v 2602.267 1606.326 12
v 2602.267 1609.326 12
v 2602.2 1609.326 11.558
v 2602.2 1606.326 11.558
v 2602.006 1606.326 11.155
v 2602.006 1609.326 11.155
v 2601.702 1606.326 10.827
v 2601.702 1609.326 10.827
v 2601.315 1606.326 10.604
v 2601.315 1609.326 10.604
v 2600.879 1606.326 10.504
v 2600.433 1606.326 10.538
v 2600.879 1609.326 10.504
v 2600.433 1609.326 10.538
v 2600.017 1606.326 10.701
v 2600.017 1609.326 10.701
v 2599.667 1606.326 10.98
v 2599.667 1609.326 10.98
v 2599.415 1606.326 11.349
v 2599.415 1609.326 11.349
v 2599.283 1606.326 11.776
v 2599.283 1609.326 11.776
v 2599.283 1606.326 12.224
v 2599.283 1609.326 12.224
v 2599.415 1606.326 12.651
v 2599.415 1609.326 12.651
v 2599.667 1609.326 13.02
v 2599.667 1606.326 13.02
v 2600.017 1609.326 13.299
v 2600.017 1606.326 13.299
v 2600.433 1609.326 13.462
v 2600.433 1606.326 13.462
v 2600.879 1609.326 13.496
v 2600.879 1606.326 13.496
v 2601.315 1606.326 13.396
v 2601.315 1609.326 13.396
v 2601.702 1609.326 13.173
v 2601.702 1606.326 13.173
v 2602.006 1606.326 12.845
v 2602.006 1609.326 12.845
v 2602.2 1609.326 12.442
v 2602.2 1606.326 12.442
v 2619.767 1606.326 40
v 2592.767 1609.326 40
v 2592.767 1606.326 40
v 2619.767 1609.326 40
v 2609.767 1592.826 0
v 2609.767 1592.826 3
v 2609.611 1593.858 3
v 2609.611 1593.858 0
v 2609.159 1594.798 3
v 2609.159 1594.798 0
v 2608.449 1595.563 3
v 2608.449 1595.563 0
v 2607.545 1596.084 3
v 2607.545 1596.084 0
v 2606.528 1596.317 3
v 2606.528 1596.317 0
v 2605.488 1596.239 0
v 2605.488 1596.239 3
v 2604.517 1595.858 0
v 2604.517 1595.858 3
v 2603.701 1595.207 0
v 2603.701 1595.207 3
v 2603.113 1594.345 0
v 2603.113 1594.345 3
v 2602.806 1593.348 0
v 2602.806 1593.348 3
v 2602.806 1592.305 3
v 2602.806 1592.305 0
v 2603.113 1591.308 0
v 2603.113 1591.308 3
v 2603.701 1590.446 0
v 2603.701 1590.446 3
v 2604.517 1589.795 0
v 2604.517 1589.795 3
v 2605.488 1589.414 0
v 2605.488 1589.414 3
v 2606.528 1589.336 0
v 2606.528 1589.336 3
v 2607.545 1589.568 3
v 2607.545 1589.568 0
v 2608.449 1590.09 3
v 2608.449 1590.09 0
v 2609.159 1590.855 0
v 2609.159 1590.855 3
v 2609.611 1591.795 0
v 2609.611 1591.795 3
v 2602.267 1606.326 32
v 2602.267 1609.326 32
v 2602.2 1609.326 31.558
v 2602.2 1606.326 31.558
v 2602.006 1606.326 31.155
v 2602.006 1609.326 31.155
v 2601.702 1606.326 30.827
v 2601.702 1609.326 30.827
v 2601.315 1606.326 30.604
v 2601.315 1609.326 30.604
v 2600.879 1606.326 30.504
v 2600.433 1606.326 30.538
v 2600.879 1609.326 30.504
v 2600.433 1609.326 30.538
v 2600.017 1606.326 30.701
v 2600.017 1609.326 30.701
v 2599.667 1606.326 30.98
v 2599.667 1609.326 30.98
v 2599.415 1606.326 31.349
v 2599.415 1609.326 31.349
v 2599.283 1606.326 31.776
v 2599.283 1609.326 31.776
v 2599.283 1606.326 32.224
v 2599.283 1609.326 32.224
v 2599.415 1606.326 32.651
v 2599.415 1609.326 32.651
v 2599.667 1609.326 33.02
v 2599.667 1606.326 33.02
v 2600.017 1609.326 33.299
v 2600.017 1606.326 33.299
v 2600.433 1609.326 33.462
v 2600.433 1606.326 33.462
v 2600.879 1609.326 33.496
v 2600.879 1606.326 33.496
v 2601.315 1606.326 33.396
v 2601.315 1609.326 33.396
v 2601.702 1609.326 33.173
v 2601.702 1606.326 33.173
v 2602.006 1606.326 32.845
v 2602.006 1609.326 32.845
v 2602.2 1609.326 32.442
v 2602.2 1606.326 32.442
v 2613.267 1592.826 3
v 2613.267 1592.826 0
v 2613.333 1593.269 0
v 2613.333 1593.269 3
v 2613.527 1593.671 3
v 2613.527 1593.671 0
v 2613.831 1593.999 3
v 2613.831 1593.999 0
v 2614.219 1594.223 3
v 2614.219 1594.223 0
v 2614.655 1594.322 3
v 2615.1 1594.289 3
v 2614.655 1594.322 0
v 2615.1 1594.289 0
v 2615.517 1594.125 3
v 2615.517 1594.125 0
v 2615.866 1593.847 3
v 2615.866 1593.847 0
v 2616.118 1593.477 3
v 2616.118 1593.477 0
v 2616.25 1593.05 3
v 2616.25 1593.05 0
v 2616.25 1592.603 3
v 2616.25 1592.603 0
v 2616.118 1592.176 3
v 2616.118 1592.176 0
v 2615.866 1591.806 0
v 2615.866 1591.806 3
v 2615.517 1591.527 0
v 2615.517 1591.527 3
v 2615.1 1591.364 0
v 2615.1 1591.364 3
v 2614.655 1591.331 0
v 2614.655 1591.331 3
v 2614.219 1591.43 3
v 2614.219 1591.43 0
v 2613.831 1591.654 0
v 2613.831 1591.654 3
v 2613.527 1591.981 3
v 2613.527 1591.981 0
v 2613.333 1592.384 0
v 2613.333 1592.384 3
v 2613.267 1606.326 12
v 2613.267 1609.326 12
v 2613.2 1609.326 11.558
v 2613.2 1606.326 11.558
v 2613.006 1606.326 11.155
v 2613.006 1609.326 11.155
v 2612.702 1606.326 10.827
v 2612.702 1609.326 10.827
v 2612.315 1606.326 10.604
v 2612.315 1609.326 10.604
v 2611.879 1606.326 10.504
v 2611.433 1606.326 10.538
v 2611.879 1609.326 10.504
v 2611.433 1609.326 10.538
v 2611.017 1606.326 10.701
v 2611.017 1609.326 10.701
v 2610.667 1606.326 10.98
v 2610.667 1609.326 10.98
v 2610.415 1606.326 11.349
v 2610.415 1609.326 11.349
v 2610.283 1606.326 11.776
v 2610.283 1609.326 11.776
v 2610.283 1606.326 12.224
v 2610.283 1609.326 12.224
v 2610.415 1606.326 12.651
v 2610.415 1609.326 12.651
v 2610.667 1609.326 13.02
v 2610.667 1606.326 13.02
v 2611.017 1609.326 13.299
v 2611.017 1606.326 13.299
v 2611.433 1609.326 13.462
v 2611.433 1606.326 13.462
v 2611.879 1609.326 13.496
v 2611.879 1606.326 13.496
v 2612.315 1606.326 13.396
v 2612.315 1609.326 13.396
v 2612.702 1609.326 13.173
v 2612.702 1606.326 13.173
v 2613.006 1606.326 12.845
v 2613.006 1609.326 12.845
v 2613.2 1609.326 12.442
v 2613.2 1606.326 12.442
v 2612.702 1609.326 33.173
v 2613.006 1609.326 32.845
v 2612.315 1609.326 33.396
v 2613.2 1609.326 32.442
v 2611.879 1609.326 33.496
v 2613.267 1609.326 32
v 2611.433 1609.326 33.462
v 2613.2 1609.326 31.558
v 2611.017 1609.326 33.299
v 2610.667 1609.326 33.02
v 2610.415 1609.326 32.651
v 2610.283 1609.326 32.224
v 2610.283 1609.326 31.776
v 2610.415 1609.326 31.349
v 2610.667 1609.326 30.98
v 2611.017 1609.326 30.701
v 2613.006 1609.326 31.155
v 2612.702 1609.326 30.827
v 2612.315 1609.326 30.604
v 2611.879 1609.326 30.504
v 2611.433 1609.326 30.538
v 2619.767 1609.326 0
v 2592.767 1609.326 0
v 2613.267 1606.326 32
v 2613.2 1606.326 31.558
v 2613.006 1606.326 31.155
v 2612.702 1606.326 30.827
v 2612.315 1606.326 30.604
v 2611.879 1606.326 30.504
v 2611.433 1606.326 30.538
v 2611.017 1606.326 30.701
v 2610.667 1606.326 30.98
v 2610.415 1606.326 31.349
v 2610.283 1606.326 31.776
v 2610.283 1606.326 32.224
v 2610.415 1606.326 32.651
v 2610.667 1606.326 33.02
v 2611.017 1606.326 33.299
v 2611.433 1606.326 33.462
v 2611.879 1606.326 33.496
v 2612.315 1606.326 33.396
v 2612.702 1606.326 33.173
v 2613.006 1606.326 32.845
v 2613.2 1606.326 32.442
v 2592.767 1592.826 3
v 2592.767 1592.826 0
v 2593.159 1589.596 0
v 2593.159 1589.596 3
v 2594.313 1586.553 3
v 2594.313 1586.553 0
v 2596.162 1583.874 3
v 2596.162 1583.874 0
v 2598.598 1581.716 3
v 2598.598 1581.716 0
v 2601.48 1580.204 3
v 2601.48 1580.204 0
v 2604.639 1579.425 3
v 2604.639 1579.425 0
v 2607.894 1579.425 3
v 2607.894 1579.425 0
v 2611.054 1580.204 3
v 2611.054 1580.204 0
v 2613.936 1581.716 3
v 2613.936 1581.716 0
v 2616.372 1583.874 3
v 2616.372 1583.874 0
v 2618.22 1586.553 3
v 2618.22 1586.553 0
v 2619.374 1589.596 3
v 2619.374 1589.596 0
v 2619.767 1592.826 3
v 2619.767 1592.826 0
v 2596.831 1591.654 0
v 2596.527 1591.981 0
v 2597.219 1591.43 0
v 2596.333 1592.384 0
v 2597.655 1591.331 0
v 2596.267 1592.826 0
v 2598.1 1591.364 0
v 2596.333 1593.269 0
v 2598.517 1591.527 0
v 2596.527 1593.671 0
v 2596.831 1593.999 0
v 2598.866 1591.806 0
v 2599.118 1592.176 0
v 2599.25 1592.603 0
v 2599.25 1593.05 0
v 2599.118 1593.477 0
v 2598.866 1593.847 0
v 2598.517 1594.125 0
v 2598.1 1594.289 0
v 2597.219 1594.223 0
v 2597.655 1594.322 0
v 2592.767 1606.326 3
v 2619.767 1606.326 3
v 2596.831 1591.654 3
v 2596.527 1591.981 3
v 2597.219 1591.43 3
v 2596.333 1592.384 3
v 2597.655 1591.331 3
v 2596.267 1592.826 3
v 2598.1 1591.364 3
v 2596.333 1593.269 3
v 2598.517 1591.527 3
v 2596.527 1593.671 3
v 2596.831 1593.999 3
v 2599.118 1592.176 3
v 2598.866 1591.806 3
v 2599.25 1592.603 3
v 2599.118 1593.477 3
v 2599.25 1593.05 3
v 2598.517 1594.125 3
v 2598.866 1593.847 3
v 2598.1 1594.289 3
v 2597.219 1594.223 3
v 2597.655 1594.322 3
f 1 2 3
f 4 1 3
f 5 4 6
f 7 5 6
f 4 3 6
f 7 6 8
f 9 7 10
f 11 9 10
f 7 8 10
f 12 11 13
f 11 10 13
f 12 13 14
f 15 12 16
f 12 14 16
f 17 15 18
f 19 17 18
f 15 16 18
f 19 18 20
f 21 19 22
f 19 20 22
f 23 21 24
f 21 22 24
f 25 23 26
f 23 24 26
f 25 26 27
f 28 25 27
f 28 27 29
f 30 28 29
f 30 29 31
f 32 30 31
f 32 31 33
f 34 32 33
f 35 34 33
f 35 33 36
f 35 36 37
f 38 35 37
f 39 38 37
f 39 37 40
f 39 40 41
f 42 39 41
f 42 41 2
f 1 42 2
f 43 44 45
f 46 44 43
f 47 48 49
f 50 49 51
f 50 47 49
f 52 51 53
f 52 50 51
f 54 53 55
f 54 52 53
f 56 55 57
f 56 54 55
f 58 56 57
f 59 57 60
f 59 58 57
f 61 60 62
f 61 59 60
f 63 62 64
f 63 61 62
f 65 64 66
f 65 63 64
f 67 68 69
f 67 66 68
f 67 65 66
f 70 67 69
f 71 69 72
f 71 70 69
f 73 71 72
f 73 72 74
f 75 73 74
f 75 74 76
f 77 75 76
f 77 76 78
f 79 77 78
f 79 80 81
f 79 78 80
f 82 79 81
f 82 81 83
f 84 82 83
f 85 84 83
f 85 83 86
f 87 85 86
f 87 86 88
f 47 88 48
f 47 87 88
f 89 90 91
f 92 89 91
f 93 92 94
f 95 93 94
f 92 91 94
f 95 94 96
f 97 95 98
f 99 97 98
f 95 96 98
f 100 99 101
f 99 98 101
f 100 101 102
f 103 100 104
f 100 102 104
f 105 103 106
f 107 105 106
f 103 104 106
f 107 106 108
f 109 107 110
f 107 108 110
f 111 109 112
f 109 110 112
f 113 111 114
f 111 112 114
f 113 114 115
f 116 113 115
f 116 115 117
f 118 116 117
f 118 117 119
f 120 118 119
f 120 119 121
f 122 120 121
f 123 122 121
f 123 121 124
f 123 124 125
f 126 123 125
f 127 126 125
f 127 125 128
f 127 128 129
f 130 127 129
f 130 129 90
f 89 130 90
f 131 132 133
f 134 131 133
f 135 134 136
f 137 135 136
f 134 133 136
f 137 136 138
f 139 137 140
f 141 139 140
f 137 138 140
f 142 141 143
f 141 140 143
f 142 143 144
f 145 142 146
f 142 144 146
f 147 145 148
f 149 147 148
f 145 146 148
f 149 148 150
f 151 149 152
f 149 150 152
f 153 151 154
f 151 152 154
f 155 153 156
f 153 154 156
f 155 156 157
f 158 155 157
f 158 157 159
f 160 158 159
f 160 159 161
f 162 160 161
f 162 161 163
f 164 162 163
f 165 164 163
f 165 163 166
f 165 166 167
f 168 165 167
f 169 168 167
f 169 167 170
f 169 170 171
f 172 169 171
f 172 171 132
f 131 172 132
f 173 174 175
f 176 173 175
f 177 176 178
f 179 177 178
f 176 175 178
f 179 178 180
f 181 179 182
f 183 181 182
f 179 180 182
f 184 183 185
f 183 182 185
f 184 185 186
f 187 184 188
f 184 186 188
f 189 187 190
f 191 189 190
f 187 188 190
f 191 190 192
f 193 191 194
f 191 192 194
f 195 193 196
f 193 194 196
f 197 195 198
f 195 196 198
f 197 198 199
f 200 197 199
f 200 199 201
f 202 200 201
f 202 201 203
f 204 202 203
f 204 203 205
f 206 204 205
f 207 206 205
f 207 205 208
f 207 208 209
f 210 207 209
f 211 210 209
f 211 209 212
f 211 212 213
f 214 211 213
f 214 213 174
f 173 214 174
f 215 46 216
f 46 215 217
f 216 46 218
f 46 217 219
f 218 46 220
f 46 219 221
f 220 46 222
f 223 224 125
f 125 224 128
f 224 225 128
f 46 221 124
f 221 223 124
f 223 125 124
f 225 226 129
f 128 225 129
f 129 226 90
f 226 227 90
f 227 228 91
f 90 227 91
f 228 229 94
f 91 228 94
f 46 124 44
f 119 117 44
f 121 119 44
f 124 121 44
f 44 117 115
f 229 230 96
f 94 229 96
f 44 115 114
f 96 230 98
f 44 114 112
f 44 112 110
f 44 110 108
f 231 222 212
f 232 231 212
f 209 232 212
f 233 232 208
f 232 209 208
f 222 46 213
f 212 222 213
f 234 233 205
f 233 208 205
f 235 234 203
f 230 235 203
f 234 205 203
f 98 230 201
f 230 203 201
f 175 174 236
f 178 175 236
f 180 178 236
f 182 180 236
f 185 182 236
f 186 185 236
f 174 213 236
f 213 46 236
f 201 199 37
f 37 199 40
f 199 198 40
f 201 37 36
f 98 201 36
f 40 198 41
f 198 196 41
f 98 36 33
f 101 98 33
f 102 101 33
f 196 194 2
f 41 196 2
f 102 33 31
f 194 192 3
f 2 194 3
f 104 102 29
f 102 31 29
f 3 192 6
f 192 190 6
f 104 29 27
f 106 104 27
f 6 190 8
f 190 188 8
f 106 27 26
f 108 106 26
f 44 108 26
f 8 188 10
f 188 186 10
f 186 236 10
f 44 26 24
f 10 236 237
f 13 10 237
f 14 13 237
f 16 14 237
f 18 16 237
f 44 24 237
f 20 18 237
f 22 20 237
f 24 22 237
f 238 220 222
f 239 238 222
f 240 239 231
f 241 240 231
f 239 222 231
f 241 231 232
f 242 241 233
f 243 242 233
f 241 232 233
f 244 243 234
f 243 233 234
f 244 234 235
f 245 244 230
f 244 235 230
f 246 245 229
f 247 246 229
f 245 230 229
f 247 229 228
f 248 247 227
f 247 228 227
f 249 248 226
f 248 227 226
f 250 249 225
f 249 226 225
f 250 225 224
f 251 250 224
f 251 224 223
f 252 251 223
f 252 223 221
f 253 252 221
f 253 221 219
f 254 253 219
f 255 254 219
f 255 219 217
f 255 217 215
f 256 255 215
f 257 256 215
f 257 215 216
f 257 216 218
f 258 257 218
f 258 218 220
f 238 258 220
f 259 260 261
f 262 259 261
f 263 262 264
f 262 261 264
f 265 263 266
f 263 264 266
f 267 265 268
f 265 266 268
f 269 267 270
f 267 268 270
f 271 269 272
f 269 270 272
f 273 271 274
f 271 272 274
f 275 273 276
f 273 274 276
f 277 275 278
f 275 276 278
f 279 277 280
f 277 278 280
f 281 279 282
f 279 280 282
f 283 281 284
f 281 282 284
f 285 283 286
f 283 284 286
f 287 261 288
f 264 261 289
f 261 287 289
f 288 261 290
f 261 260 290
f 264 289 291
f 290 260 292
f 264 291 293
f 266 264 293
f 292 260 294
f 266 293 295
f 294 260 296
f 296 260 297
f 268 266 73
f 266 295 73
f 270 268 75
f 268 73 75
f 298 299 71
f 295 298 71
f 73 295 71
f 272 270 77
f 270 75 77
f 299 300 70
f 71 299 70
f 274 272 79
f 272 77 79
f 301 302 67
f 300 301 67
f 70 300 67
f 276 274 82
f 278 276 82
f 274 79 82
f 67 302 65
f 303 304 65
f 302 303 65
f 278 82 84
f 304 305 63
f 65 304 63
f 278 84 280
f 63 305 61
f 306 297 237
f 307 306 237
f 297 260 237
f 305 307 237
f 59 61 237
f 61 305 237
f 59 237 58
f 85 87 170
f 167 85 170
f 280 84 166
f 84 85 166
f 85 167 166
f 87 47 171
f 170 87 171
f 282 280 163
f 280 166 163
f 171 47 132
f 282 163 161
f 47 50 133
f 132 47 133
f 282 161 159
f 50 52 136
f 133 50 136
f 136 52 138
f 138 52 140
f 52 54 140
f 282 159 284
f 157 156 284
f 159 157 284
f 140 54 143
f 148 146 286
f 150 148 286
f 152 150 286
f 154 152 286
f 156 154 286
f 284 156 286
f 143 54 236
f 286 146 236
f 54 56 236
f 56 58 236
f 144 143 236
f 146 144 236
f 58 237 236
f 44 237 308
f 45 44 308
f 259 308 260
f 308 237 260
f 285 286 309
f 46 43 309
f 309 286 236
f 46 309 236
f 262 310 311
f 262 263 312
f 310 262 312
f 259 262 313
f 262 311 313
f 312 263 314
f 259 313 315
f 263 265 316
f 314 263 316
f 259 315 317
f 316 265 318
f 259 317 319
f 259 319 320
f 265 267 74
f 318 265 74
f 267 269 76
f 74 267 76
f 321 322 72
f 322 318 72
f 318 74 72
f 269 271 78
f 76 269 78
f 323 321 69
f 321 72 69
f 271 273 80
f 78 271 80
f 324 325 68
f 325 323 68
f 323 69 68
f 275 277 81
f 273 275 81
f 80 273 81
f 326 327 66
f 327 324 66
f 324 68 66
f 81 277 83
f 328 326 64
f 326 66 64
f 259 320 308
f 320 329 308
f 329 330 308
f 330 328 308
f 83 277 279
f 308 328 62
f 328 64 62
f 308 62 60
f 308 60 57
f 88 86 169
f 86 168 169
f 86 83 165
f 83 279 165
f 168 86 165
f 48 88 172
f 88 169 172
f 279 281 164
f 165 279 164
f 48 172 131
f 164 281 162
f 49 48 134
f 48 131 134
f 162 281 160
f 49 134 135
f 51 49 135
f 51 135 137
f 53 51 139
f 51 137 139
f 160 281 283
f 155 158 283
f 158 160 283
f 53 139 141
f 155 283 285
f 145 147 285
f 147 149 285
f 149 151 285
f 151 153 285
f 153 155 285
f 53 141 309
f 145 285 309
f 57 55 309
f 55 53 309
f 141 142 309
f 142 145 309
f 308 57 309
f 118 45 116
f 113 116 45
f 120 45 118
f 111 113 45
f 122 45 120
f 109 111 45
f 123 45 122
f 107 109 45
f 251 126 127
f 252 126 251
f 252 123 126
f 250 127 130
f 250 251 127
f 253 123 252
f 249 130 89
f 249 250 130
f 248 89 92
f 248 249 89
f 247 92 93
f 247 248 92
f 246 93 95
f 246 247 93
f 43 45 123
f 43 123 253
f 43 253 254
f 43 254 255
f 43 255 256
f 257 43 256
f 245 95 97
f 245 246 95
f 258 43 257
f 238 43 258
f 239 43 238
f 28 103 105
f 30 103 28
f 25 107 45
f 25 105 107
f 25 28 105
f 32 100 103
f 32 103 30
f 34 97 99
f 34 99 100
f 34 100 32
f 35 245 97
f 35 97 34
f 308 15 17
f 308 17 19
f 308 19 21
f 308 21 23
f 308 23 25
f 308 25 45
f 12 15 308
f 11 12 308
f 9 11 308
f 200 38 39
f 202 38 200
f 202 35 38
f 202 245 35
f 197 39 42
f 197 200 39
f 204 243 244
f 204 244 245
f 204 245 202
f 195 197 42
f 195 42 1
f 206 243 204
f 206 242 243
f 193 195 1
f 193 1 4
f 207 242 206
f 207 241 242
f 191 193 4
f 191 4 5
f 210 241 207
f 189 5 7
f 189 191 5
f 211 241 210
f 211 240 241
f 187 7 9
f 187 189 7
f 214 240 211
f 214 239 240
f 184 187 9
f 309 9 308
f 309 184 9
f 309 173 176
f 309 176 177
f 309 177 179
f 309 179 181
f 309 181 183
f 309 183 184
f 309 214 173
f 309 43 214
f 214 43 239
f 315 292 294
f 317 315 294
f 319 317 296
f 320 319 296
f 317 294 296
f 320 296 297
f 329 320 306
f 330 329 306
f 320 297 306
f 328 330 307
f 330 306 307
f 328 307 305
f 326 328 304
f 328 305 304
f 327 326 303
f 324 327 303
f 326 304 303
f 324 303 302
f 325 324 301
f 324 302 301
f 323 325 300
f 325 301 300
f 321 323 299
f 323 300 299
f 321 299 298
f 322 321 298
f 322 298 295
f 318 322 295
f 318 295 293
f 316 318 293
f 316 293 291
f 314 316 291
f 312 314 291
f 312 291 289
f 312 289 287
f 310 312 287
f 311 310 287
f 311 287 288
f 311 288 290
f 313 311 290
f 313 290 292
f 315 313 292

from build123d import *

# Parameters (mm, degrees)
MODEL_R             = 3.5
EXTRUDE_1_DEPTH     = 40
SKETCH_3_W          = 37
SKETCH_3_H          = 37
CUT_EXTRUDE_1_DEPTH = 40
SKETCH_4_R          = 1.5
CUT_EXTRUDE_2_DEPTH = 40
CUT_EXTRUDE1_REACH  = 42
SKETCH2_R           = 1.5


with BuildPart() as part:
    # Model → 凸台-拉伸1 (new body)
    with BuildSketch(Plane.XY):
        with BuildLine():
            Line((2619.766714505, 1592.826425633), (2619.766714505, 1609.326425633))
            Line((2619.766714505, 1609.326425633), (2592.766714505, 1609.326425633))
            Line((2592.766714505, 1609.326425633), (2592.766714505, 1592.826425633))
            ThreePointArc((2592.766714505, 1592.826425633), (2606.266714505, 1579.326425633), (2619.766714505, 1592.826425633))
        make_face()
        with Locations((2606.266714505, 1592.826425633)):
            Circle(MODEL_R, mode=Mode.SUBTRACT)
    extrude(amount=EXTRUDE_1_DEPTH)

    # 草图3 → 切除-拉伸1 (cut)
    with BuildSketch(Plane(origin=(2619.766714505, 0, 0), x_dir=(0, 0, -1), z_dir=(1, 0, 0))):
        with Locations((-21.5, 1587.826425633)):
            Rectangle(SKETCH_3_W, SKETCH_3_H)
    extrude(amount=-CUT_EXTRUDE_1_DEPTH, mode=Mode.SUBTRACT)

    # 草图4 → 切除-拉伸2 (cut)
    with BuildSketch(Plane(origin=(0, 1609.326425633, 0), x_dir=(1, 0, 0), z_dir=(0, 1, 0))):
        with Locations((2600.766714505, -32)):
            Circle(SKETCH_4_R)
        with Locations((2611.766714505, -32)):
            Circle(SKETCH_4_R)
        with Locations((2600.766714505, -12)):
            Circle(SKETCH_4_R)
        with Locations((2611.766714505, -12)):
            Circle(SKETCH_4_R)
    extrude(amount=-CUT_EXTRUDE_2_DEPTH, mode=Mode.SUBTRACT)

    # Sketch2 → Cut-Extrude1 (cut, up to next)
    with BuildSketch(Plane(origin=(0, 0, 0), x_dir=(-1, 0, 0), z_dir=(0, 0, -1)), mode=Mode.PRIVATE) as cut_extrude1_sk1:
        with Locations((-2597.766714505, 1592.826425633)):
            Circle(SKETCH2_R)
    cut_extrude1_tool1 = extrude(cut_extrude1_sk1.sketch, amount=-CUT_EXTRUDE1_REACH, mode=Mode.PRIVATE) & part.part
    add(cut_extrude1_tool1.solids().sort_by_distance((2597.766715, 1592.826426, 0))[0], mode=Mode.SUBTRACT)
    # Sketch2 → Cut-Extrude1 (cut, up to next)
    with BuildSketch(Plane(origin=(0, 0, 0), x_dir=(-1, 0, 0), z_dir=(0, 0, -1)), mode=Mode.PRIVATE) as cut_extrude1_sk2:
        with Locations((-2614.766714505, 1592.826425633)):
            Circle(SKETCH2_R)
    cut_extrude1_tool2 = extrude(cut_extrude1_sk2.sketch, amount=-CUT_EXTRUDE1_REACH, mode=Mode.PRIVATE) & part.part
    add(cut_extrude1_tool2.solids().sort_by_distance((2614.766715, 1592.826426, 0))[0], mode=Mode.SUBTRACT)


solid = part.part
